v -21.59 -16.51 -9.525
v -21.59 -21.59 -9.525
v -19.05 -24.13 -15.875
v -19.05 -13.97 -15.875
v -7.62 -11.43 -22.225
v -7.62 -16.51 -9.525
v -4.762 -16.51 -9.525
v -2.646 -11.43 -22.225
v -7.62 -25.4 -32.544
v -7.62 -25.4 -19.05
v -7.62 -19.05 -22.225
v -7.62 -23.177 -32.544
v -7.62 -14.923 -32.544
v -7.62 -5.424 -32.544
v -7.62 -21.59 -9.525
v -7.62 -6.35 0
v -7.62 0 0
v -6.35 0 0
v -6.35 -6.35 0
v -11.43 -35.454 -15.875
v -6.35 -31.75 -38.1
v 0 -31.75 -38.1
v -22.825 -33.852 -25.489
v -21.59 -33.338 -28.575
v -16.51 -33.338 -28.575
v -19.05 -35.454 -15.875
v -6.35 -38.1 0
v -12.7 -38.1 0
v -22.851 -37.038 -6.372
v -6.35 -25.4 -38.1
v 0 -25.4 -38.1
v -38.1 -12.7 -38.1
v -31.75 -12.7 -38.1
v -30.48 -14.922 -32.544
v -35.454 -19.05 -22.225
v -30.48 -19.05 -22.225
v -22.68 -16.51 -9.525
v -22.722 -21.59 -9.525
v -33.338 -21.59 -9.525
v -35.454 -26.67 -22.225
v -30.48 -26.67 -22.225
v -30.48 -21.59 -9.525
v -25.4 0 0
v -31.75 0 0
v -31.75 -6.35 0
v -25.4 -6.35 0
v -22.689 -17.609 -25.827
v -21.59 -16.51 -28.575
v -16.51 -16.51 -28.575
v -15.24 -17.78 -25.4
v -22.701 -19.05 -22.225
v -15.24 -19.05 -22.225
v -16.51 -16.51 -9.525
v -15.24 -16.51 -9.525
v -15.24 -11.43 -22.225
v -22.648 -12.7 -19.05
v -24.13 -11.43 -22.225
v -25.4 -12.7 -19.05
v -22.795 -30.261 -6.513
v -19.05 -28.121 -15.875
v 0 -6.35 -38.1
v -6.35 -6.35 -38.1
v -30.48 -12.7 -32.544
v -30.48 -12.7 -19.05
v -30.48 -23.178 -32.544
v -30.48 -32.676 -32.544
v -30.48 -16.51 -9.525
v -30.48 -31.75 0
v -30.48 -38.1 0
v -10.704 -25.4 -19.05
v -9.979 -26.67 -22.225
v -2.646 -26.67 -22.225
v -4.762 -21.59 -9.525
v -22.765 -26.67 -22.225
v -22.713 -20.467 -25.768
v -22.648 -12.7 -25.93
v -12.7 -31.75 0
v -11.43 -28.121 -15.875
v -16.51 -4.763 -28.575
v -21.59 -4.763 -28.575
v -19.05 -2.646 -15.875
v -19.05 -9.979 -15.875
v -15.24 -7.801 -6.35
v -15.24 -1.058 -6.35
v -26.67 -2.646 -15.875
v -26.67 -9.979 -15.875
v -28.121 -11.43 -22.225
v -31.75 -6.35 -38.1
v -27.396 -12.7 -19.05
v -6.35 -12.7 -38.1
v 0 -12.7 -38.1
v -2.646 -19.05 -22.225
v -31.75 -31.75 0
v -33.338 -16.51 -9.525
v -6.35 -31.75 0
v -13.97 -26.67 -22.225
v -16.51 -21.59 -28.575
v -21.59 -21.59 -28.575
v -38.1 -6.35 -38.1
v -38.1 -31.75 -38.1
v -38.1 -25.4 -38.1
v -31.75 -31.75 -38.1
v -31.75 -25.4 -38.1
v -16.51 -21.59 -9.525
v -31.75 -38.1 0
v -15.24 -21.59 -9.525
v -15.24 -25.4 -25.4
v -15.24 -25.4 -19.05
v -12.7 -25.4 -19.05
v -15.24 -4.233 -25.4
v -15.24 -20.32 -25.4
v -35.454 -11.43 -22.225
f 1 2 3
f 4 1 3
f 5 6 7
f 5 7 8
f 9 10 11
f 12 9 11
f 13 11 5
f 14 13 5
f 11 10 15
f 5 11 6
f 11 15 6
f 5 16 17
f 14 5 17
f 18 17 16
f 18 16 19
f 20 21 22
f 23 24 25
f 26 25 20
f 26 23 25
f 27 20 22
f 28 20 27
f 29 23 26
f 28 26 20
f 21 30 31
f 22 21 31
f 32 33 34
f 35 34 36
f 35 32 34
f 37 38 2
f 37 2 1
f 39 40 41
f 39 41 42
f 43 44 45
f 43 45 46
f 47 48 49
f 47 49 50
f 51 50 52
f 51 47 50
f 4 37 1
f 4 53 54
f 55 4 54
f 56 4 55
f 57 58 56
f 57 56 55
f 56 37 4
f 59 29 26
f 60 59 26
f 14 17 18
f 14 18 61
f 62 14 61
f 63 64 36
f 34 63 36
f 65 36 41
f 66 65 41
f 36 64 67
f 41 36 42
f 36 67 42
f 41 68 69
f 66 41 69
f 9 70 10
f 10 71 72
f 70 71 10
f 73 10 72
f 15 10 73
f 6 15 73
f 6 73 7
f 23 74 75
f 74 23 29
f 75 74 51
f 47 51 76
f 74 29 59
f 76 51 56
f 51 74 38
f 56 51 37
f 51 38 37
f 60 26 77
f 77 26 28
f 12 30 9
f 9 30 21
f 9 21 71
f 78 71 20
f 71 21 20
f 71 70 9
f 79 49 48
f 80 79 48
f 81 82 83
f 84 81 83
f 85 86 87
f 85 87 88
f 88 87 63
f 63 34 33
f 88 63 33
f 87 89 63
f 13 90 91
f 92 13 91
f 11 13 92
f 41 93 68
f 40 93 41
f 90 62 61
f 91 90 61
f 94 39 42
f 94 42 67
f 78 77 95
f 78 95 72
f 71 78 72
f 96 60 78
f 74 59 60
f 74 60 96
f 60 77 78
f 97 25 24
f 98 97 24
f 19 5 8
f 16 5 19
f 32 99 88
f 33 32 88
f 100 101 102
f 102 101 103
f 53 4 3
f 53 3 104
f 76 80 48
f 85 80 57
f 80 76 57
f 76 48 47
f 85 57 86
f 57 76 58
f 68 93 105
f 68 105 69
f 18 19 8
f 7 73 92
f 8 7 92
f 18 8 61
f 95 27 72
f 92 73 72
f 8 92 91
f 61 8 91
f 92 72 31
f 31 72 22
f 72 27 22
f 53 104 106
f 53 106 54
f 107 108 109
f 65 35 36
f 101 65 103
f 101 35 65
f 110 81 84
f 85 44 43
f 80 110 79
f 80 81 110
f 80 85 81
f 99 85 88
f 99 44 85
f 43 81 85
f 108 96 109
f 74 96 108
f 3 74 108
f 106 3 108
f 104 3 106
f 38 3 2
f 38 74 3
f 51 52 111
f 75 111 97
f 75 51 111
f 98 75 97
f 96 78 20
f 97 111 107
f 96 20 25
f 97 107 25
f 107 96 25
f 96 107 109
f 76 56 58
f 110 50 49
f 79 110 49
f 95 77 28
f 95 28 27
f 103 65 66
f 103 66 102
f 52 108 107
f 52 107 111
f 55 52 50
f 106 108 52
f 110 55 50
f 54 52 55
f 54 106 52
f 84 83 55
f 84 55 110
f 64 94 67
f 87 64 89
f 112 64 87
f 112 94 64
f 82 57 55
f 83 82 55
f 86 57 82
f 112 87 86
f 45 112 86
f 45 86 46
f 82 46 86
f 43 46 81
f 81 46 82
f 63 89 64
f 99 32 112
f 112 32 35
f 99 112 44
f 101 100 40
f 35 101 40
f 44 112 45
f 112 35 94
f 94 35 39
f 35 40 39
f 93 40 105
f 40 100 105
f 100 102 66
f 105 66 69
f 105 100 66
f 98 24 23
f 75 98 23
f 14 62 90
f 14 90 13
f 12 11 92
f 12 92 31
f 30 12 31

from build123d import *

# Parameters (mm, degrees)
F0_W     = 38.1
F0_H     = 38.1
F1_DEPTH = 38.1
F5_DEPTH = 38.1
F7_DEPTH = 38.1
F8_W     = 7.62
F8_H     = 25.4
F9_DEPTH = 38.1


with BuildPart() as f1:
    # F0 (on Front) → F1 (new body)
    with BuildSketch(Plane.XZ):
        with Locations((-19.05, -19.05)):
            Rectangle(F0_W, F0_H)
    extrude(amount=F1_DEPTH)

    # F4 (on offset) → F5 (cut)
    with BuildSketch(Plane.YZ.offset(-38.1)):
        Polygon((-25.4, -38.1), (-12.7, -38.1), (-19.05, -22.225), align=None)
        Polygon((-11.43, -22.225), (-6.35, 0), (-31.75, 0), (-26.67, -22.225), (-21.59, -9.525), (-16.51, -9.525), align=None)
        Polygon((-31.75, -38.1), (-38.1, 0), (-38.1, -38.1), align=None)
        Polygon((0, -38.1), (0, 0), (-6.35, -38.1), align=None)
    extrude(amount=F5_DEPTH, mode=Mode.SUBTRACT)

    # F6 (on offset) → F7 (cut)
    with BuildSketch(Plane.XZ.offset(38.1)):
        Polygon((-26.67, -15.875), (-31.75, -38.1), (-6.35, -38.1), (-11.43, -15.875), (-16.51, -28.575), (-21.59, -28.575), align=None)
        Polygon((-12.7, 0), (-25.4, 0), (-19.05, -15.875), align=None)
        Polygon((-6.35, 0), (0, -38.1), (0, 0), align=None)
        Polygon((-38.1, 0), (-38.1, -38.1), (-31.75, 0), align=None)
    extrude(amount=-F7_DEPTH, mode=Mode.SUBTRACT)

    # F8 (on Top) → F9 (cut)
    with BuildSketch(Plane.XY):
        with Locations((-11.43, -12.7)):
            Rectangle(F8_W, F8_H)
        Polygon((-30.48, -38.1), (-22.86, -38.1), (-22.648146, -12.7), (-30.48, -12.7), align=None)
    extrude(amount=-F9_DEPTH, mode=Mode.SUBTRACT)


solid = f1.part
